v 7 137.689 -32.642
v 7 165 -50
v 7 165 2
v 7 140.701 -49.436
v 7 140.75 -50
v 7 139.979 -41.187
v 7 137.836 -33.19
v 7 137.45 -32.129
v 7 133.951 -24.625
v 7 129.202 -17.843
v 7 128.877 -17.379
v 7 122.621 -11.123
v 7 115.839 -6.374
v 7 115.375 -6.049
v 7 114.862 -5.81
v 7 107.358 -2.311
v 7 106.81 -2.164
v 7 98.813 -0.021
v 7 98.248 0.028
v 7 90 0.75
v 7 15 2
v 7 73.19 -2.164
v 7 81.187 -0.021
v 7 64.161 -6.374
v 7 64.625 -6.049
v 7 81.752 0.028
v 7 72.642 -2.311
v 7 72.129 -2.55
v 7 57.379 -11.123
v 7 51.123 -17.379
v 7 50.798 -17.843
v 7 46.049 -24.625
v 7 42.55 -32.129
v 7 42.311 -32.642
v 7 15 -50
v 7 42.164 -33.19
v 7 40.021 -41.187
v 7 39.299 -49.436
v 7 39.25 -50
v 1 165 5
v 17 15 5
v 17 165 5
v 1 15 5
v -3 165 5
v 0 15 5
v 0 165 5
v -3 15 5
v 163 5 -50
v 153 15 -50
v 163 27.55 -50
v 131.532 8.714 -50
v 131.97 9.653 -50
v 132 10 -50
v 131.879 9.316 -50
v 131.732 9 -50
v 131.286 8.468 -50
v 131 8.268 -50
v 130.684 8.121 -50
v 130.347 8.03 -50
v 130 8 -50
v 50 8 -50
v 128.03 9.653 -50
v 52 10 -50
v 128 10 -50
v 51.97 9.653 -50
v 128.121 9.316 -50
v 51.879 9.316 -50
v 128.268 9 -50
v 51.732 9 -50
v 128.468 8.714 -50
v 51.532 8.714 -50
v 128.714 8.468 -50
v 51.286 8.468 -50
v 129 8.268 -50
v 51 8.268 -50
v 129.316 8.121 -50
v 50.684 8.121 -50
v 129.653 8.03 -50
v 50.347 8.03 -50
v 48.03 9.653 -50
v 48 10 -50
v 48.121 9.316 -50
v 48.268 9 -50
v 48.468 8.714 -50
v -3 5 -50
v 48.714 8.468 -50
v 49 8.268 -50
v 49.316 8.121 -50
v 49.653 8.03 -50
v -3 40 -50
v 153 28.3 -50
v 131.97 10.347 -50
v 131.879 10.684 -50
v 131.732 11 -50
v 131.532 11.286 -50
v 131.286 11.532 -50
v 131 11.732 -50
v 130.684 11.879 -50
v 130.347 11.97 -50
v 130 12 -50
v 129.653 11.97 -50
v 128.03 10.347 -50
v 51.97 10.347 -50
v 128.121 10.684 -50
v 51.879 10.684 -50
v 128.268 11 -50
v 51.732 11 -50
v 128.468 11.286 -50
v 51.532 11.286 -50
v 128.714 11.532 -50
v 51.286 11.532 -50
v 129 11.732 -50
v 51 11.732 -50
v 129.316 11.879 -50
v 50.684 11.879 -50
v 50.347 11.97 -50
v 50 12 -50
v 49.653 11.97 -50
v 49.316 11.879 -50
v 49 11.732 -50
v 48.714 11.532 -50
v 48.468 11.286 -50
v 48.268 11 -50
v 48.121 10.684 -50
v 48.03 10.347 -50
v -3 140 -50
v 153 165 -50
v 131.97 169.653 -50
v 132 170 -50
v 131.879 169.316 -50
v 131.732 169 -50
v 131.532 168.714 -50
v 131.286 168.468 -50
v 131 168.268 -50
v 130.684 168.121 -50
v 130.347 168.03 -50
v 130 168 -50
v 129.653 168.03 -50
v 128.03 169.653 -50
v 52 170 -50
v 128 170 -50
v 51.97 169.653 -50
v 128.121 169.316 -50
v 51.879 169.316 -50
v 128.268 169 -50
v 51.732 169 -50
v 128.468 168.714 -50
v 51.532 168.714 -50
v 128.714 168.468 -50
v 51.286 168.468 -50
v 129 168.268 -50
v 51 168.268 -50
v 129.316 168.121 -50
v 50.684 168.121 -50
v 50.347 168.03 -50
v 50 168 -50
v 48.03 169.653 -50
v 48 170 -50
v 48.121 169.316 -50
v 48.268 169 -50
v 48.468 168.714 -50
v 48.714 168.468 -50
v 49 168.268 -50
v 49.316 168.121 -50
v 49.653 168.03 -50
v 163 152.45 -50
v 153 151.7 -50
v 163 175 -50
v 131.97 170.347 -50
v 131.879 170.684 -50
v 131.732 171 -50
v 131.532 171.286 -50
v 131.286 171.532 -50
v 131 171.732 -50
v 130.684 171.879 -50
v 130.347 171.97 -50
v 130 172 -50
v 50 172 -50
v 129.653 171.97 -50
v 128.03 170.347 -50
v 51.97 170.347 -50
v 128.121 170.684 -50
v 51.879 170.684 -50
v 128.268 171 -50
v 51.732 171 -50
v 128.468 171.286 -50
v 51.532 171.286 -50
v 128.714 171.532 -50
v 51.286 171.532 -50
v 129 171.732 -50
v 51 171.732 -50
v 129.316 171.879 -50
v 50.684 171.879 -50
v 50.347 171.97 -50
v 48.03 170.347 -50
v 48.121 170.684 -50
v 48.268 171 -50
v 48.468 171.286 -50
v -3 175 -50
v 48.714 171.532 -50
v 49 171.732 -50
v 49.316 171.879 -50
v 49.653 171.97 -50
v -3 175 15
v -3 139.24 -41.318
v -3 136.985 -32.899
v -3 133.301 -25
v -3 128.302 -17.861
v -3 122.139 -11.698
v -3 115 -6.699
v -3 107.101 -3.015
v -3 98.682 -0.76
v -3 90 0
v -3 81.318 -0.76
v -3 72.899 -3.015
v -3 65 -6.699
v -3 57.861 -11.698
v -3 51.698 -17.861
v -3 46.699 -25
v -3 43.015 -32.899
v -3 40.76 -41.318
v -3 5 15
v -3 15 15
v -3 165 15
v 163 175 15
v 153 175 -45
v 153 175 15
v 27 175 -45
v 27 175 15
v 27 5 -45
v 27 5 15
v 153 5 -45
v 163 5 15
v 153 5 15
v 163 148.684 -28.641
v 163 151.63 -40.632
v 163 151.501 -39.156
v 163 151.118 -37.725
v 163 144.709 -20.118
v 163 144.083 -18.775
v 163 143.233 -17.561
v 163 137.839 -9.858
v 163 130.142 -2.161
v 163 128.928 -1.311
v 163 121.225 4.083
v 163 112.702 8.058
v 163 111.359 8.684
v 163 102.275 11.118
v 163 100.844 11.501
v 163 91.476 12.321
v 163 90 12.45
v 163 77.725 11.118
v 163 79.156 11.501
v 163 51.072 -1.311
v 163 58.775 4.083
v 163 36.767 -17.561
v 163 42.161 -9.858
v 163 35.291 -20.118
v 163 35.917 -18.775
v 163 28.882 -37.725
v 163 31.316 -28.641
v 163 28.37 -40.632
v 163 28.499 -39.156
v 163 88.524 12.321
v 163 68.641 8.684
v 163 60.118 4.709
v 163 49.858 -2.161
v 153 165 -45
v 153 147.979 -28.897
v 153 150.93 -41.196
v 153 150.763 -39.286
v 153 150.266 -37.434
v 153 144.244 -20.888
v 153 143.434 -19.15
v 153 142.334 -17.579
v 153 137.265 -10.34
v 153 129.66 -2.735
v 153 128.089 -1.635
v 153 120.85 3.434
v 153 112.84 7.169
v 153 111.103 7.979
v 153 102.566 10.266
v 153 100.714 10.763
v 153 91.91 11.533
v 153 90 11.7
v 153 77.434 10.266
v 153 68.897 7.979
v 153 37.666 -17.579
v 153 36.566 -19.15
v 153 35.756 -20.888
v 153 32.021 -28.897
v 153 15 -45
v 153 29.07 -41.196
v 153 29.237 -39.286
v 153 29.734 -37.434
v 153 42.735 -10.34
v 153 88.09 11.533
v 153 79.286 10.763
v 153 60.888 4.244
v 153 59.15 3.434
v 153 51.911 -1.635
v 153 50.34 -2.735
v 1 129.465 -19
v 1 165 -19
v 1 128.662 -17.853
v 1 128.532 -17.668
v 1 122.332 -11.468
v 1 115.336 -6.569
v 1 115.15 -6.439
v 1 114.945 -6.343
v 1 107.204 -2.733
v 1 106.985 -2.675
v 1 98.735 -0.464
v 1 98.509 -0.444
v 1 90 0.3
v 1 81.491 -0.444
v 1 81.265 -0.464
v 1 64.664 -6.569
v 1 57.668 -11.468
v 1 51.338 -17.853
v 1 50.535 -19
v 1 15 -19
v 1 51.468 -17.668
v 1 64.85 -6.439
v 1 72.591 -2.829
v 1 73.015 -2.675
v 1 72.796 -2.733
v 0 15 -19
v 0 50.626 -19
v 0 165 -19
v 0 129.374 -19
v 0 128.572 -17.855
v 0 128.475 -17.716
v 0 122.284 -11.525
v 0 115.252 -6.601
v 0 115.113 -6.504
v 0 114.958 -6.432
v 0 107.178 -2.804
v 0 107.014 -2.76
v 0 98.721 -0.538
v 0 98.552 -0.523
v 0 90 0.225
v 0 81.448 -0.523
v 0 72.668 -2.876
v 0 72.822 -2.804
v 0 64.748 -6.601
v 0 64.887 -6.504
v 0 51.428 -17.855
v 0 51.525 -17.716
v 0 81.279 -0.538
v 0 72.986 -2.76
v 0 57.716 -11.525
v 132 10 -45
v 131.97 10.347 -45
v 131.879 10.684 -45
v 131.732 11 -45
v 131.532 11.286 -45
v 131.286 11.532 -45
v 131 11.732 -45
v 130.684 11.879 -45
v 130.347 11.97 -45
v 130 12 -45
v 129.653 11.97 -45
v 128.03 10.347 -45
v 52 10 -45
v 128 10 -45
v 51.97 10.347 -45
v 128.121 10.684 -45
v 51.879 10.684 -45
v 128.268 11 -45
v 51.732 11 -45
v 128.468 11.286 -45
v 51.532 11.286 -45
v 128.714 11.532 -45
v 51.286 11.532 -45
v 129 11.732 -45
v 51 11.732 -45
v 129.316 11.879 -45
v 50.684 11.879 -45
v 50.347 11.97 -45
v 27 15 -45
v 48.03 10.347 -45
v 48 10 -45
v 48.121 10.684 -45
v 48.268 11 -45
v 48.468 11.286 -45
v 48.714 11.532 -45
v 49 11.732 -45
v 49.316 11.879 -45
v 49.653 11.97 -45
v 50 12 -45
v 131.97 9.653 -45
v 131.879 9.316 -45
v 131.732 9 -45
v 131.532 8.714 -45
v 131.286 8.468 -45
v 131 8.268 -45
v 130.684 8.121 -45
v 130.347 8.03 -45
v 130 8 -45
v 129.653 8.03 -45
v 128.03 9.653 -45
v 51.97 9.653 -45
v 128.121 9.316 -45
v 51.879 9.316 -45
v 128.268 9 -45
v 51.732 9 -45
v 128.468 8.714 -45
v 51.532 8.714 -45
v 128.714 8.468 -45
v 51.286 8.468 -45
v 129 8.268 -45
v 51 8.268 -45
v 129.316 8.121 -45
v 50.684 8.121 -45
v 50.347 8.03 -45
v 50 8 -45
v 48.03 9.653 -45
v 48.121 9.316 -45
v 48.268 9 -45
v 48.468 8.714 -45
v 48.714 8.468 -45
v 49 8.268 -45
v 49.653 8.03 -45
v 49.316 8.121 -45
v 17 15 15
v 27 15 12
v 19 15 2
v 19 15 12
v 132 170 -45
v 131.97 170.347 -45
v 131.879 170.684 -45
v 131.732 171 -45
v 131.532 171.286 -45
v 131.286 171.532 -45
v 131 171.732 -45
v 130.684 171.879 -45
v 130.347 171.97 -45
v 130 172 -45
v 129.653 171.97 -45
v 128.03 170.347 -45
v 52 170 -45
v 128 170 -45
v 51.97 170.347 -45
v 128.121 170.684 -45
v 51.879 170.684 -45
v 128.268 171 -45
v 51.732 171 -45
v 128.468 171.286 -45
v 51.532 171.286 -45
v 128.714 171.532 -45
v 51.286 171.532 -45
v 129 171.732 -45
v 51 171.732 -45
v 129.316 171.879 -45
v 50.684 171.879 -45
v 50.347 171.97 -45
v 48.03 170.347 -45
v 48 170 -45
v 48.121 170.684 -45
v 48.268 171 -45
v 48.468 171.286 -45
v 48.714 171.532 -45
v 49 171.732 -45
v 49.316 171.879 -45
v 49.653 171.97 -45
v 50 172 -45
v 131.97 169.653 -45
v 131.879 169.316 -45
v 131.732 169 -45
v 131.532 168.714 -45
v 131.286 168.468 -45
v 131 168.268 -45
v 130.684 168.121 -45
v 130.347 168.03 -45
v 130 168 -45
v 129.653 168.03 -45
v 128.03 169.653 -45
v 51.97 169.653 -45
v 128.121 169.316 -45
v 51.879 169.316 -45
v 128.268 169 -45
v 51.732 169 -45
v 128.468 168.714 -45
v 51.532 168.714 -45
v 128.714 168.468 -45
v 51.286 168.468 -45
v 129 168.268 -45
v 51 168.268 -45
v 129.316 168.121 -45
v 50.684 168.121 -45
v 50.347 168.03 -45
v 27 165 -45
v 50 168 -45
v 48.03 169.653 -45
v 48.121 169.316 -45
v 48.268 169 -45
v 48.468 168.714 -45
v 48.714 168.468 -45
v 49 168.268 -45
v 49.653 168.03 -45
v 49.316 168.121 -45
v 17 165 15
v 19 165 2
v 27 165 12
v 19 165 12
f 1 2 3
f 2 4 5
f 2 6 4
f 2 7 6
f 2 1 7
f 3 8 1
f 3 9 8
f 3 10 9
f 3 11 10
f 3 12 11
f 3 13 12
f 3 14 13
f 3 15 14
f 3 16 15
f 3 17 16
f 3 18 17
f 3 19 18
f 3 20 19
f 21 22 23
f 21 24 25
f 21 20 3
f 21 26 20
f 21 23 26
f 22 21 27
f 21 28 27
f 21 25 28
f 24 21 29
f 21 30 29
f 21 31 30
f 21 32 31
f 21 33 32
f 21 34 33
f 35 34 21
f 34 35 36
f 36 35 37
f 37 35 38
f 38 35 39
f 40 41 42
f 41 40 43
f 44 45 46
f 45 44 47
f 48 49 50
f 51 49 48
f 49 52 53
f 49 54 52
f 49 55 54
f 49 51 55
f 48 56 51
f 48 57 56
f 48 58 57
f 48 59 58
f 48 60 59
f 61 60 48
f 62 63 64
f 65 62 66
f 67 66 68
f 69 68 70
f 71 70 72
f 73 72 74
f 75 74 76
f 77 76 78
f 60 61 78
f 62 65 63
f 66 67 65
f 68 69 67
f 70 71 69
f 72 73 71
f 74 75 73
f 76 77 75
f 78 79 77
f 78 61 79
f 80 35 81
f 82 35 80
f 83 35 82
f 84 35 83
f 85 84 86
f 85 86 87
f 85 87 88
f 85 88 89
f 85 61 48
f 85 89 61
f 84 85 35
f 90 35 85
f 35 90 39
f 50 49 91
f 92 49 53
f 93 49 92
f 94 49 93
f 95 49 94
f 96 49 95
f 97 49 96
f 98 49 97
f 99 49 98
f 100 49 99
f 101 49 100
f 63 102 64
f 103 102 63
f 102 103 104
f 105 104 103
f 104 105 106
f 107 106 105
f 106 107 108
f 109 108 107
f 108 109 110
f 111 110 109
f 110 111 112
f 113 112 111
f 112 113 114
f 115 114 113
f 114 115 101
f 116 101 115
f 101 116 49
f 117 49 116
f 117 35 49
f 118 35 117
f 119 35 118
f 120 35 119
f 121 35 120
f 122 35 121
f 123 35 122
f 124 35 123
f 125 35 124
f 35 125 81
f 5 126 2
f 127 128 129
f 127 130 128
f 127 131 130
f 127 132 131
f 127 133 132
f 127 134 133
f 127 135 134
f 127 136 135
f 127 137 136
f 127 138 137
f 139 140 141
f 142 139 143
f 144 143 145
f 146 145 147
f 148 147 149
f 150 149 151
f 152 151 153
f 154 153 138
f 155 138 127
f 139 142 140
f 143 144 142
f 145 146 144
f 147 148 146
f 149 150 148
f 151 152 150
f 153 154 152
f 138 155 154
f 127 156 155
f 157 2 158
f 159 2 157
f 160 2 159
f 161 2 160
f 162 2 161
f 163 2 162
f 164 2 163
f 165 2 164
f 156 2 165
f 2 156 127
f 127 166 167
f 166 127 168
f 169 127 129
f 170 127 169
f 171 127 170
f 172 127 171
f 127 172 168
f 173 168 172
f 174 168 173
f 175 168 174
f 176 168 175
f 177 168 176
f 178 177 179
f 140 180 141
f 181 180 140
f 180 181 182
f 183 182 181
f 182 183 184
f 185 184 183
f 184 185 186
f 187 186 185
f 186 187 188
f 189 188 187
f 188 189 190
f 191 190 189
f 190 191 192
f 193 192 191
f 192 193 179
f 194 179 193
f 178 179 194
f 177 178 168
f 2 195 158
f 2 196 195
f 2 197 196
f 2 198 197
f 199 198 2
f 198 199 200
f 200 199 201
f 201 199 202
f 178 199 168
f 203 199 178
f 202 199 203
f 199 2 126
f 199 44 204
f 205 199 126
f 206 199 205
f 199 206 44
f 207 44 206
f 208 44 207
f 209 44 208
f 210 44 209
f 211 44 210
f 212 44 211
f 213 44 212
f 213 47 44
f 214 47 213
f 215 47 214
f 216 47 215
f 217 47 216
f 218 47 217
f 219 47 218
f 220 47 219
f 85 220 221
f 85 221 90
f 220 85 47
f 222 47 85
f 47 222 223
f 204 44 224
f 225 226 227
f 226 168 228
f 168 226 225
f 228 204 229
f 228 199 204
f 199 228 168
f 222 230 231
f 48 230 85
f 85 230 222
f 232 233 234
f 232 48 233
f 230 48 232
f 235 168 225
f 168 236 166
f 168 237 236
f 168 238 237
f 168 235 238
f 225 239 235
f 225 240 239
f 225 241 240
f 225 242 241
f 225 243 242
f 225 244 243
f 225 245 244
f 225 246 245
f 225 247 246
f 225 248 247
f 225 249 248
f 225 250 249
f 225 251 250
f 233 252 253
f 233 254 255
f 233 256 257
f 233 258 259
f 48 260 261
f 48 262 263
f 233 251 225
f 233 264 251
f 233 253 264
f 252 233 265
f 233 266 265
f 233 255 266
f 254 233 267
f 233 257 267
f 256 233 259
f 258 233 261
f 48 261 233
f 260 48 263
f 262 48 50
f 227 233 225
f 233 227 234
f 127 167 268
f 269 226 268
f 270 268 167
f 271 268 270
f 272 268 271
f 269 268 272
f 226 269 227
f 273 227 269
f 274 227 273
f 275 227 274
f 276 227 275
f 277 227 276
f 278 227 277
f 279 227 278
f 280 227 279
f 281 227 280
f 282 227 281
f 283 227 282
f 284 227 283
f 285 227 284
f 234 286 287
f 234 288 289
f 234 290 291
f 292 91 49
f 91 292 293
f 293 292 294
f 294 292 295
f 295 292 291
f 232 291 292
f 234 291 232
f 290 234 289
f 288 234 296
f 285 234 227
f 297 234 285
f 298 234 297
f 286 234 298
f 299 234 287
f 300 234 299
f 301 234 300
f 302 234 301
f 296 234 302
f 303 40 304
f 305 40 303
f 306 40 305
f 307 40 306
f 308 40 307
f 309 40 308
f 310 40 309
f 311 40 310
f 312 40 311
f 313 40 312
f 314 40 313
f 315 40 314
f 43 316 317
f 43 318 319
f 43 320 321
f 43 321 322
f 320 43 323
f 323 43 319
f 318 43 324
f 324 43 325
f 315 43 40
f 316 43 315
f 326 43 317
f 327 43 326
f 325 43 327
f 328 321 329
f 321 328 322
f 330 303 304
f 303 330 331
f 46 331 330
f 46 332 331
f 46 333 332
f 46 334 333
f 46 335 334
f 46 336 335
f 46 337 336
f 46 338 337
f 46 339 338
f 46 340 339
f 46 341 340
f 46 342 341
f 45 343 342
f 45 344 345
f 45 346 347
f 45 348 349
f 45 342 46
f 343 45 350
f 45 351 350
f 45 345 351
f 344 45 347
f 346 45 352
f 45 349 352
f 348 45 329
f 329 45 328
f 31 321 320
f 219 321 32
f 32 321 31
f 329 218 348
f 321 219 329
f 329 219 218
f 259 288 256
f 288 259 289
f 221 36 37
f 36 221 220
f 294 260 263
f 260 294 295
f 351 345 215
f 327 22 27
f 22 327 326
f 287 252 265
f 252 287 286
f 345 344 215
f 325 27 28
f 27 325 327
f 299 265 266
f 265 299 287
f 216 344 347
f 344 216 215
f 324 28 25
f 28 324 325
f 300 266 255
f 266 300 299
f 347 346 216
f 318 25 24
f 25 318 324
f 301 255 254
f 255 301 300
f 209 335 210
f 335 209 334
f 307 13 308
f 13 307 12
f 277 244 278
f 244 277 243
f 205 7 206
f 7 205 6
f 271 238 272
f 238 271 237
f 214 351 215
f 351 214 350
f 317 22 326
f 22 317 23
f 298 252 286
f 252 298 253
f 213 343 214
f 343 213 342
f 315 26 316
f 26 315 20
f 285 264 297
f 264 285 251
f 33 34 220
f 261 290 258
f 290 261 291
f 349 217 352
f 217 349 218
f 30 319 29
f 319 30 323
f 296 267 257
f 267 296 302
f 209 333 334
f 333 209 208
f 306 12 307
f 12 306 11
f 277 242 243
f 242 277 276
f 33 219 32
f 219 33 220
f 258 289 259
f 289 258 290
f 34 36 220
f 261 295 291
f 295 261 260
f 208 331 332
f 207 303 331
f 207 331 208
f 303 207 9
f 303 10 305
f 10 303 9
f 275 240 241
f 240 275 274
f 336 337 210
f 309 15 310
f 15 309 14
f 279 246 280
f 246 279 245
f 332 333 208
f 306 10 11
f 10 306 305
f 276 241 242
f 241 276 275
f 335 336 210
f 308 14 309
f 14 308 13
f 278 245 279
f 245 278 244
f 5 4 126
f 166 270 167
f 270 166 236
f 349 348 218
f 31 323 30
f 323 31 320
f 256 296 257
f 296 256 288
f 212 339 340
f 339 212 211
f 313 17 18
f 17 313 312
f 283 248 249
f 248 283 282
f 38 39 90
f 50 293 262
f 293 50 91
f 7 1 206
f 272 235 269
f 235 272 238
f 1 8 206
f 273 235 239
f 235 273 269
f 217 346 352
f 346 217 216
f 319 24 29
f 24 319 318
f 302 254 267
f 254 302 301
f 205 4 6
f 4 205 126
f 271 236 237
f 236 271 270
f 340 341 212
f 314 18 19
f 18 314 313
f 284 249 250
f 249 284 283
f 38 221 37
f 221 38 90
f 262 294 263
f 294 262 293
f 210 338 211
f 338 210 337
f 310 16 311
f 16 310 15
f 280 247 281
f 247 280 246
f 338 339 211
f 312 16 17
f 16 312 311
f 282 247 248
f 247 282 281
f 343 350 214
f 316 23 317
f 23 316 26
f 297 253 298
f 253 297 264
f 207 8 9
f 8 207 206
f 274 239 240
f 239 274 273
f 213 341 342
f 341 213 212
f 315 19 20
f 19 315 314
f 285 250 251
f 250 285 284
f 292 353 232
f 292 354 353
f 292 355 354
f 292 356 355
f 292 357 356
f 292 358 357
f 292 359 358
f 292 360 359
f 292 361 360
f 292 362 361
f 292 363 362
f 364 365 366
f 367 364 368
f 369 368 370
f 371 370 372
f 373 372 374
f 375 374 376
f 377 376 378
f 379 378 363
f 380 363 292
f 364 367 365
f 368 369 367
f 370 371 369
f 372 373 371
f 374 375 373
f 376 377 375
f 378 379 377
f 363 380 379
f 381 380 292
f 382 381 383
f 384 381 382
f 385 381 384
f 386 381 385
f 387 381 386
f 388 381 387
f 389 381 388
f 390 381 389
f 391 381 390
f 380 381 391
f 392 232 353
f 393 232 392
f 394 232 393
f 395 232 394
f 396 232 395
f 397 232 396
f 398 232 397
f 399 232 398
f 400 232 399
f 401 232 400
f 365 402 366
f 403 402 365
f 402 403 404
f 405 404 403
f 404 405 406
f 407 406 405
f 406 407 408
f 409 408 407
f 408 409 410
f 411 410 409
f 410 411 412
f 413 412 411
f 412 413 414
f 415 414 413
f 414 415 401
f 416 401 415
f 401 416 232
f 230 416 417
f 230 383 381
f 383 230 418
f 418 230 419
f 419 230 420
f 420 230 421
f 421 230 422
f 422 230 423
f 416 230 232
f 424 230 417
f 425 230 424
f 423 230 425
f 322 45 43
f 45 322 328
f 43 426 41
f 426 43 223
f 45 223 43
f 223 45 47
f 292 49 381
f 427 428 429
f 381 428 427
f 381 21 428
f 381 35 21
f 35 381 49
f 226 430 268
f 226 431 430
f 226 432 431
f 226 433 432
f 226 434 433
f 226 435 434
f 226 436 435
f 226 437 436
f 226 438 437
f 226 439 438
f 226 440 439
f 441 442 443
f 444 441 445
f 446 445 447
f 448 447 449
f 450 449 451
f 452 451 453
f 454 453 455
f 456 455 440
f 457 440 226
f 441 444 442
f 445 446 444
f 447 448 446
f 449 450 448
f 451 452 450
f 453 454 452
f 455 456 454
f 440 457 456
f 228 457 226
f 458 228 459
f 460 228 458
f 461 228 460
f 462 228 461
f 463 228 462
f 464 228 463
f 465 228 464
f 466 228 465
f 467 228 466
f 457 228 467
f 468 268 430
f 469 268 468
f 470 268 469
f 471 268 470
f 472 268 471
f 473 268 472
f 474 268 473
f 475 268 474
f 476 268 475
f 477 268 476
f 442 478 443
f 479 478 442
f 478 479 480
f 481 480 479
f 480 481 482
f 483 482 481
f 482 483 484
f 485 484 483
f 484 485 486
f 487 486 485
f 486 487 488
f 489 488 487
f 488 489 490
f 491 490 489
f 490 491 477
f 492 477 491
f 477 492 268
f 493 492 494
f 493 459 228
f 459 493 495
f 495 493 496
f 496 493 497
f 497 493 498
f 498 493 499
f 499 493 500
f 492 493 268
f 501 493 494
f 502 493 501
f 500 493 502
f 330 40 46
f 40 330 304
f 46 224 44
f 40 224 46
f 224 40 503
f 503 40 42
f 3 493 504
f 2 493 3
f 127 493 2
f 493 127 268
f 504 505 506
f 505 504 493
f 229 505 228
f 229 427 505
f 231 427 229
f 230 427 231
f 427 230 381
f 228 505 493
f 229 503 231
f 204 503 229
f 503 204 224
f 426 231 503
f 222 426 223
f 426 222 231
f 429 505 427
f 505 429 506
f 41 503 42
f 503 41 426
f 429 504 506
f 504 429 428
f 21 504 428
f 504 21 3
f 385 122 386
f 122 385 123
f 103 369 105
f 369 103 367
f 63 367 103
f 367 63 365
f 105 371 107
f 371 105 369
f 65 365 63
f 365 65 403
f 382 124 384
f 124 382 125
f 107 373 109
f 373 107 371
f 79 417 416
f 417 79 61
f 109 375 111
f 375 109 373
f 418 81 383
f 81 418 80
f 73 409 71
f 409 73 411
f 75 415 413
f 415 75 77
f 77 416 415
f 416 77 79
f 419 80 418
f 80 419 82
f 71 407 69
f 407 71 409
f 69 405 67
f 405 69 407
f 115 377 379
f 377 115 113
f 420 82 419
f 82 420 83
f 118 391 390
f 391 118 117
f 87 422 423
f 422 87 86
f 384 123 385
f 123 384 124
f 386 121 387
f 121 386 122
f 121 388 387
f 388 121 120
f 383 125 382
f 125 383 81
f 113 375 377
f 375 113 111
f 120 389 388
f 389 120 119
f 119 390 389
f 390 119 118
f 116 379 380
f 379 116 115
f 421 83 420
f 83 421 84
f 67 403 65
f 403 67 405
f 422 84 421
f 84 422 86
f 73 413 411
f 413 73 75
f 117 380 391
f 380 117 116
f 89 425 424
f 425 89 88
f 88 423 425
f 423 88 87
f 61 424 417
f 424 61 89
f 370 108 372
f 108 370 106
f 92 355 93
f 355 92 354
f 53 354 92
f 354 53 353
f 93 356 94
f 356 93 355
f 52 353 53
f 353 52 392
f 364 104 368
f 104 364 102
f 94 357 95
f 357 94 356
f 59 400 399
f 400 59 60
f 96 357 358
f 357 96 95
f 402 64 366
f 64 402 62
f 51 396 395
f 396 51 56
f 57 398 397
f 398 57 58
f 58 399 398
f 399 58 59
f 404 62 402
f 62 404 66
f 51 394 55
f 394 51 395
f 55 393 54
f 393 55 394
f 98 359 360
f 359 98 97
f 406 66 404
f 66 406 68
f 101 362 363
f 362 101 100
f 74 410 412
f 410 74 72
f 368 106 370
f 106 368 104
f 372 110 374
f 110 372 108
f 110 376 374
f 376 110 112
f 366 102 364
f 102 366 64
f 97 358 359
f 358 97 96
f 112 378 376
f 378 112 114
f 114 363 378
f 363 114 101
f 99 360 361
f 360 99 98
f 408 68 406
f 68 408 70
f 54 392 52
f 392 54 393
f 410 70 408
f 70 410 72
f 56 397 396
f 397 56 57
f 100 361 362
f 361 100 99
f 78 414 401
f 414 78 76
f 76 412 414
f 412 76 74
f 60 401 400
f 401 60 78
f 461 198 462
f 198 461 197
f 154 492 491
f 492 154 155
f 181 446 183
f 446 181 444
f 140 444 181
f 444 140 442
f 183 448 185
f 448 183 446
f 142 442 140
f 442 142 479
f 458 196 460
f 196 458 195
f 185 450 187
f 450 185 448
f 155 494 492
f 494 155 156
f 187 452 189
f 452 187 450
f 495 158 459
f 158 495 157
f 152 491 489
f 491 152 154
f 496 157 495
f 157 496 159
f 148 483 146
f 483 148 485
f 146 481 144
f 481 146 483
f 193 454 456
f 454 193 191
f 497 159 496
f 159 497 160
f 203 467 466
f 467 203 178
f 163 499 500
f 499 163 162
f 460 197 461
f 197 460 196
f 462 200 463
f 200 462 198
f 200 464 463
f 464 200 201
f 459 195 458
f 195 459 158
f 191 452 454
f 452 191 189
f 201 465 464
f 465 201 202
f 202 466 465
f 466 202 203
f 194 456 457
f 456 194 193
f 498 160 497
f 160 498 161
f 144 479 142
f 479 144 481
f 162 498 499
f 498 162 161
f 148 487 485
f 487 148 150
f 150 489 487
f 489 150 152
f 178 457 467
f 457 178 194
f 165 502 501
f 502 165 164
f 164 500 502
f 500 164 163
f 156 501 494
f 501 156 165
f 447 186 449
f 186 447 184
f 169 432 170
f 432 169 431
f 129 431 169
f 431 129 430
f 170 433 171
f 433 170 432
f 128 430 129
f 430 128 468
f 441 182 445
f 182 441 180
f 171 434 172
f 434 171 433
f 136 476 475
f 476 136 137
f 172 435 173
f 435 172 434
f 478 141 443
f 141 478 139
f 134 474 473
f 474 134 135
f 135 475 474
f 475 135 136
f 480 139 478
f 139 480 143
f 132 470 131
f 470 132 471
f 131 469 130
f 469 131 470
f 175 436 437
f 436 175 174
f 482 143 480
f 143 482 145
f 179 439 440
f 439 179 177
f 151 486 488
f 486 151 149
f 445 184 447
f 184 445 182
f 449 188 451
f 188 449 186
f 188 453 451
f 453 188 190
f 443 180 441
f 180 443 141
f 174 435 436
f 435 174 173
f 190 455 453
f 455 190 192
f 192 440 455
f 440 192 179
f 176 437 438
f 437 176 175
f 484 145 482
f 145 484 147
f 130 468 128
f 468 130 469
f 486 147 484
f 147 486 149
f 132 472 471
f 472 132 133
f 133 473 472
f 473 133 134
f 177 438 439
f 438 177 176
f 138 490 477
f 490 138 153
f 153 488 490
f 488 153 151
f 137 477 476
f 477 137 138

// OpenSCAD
wall_thickness = 4;
bay_height = 35;
bays = 4;
caddy_width = 110;
bezel_depth = 35;
cage_depth = 149;
backplane_width = 113;
backplane_height = 143;
fan_height = 30;
backplane_offset_y = wall_thickness - 0.5;
backplane_offset_z = wall_thickness - 1;

cage_width = caddy_width + wall_thickness*2;
cage_height = (bay_height*4)+wall_thickness*2;

pcie_bracket_thickness=1.5;

$fn=36;

module gpu_stand(){
   difference(){
        union(){
            translate([-3,5,-50]){
                cube([10,170,55]);
            }
            translate([153,5,-50]){
                cube([10,170,65]);
            }
            
        }
        translate([0,7,-19]){
            cube([1,166,40]);
        }
        translate([-3,90,-50]){
            rotate([0,90,0]){
                cylinder(200,50,65);
            }
        }
    }
    difference(){
        union(){
            translate([-3,5,-50]){
                //cube([30,170,5]);
            }
            translate([-3,5,-50]){
                cube([165,10,5]);
            }
            translate([-3,165,-50]){
                cube([165,10,5]);
            }
            translate([153,5,-50]){
                //cube([10,170,5]);
            }
            translate([-3,5,-50]){
                cube([30,10,65]);
            }
            translate([-3,165,-50]){
                cube([30,10,65]);
            }
            translate([153,5,-50]){
                cube([10,10,65]);
            }
            translate([153,165,-50]){
                cube([10,10,65]);
            }

           
            translate([17,5,12]){
                cube([10,170,3]);
            }
            translate([17,5,2]){
                cube([2,170,10]);
            }
            translate([7,5,2]){
                cube([10,170,3]);
            }
        }
        translate([2,0,-40]){
            //cube([20,200,30]);
        }
        translate([50,10,-50]){
            cylinder(10,2,2);
        }
        translate([130,10,-50]){
            cylinder(10,2,2);
        }
        translate([50,170,-50]){
            cylinder(10,2,2);
        }
        translate([130,170,-50]){
            cylinder(10,2,2);
        }
    }
    
}

module front_panel_fan(){
    difference(){
        cube([30,150,150]);
        translate([3,15,15]){
            cube([30,120,120]);
        }
        translate([0,75,75]){
            rotate([0,90,0]){
                cylinder(20,55,55);
            }
        }
    }
}
module pci_bracket() {
union() {
difference() {
union () {
translate([0,-0.25,0]) cube([115,18.5,pcie_bracket_thickness],center=true);
translate([58.5,2.5,0]) cube([8,18.5,pcie_bracket_thickness],center=true);
}
translate([57,-13.7,0]) rotate([0,0,40]) cube([10,10,10],center=true);
translate([55,16,0]) rotate([0,0,40]) cube([10,10,10],center=true);
translate([-50,-12.5,0]) rotate([0,0,45]) cube([10,10,10],center=true);
translate([-50,12.5,0]) rotate([0,0,45]) cube([10,10,10],center=true);
translate([-55,-10.5,0]) cube([10,10,10],center=true);
translate([-55,10.5,0]) cube([10,10,10],center=true);
}
difference() {
translate([62,2.5,6]) cube([pcie_bracket_thickness,18.5,11],center=true);
translate([62,10.75,5.5]) cube([2,6,4],center=true);
translate([62,8,5.5]) rotate([0,90,0]) cylinder(r=2,h=2,center=true);
}
}
}

module vga_hole() { //28 long
translate([12.5,0,0]) cylinder(r=1.5,h=10,center=true);
translate([-12.5,0,0]) cylinder(r=1.5,h=10,center=true);
cube([19,11,10],center=true);
}

module dvi_hole() { //36 long
union() {
translate([16.5,0,0]) cylinder(r=1.5,h=10,center=true);
translate([-16.5,0,0]) cylinder(r=1.5,h=10,center=true);
cube([24.5,9,10],center=true);
}
}

module drive_cage_damper(){
    union(){
        cube([10,3,cage_height]);
        translate([5,3+wall_thickness,19]){
            rotate([90,0,0]){
                cylinder(wall_thickness,1.6,1.6);
            }
        }
        translate([5,3+wall_thickness,19+bay_height]){
            rotate([90,0,0]){
                cylinder(wall_thickness,1.6,1.6);
            }
        }
         translate([5,3+wall_thickness,19+bay_height*2]){
            rotate([90,0,0]){
                cylinder(wall_thickness,1.6,1.6);
            }
        }
        translate([5,3+wall_thickness,19+bay_height*3]){
            rotate([90,0,0]){
                cylinder(wall_thickness,1.6,1.6);
            }
        }
    }
}

module gpu_bracket() {
    difference() {
        pci_bracket();
        translate([-30,0,0]) {
        //translate([35,1,0]) {
        vga_hole();
        translate([60,0,0]) {
        // translate([-41,-2,0]) {
          dvi_hole();
        }
     }
}
}



module psu(){
    cube([160,150,86]);
}

module cpu_cooler(){
    translate([20,0,0]){
        cube([20,360,120]);
    }
    fan();
    translate([0,120,0]){
        fan();
    }
    translate([0,240,0]){
        fan();
    }
}

module fan(){
    difference(){
        cube([20,120,120]);
        translate([0,60,60]){
            rotate([0,90,0]){
                cylinder(20,55,55);
            }
        }
    }
    
}

module gpu(){
    translate([0,0,15]){
        cube([312,63,111.5]);
    }
    translate([45,61,0]){
        cube([85,2,15]);
    }
    translate([33,61,5]){
        cube([8,2,10]);
    }
    translate([0,61,5]){
        cube([15,2,10]);
    }
    
    translate([0,36,38]){
        rotate([90,270,270]){
            gpu_bracket();
        }
    }
    translate([0,54,38]){
        rotate([90,270,270]){
            gpu_bracket();
        }
    }
}

module motherboard(){
  cube([300,330,30]);
}

module support_board(){
        cube([500,320,10]);
        translate([0,330,0]){
            cube([500,600,10]);
        }
}

module fan_holder(){
    translate([5+bezel_depth+cage_depth+3,(cage_width-105)/2,cage_height-wall_thickness-115]){
        rotate([0,90,0]){
            cylinder(fan_height,2.2,2.2);
            translate([0,105,0]){
                cylinder(fan_height,2.2,2.2);
            }
            translate([-105,0,0]){
                cylinder(fan_height,2.2,2.2);
            }
            translate([-105,105,0]){
                cylinder(fan_height,2.2,2.2);
            }
        }
        //bottom left corner
        translate([0,-2,-3]){
                cube([13,20,5]);     
        }
        //top piece
        translate([0,-3,103]){
                cube([13,backplane_width,6]);     
        }
        //top left sticky up bit
        translate([0,-3,108]){
                cube([13,5,9]);     
        }
        translate([13,-3,113]){
                cube([10,5,4]);     
        }
        //top right sticky up bit
        translate([0,backplane_width-9,108]){
                cube([13,5,9]);     
        }
        translate([13,backplane_width-9,113]){
                cube([10,5,4]);     
        }
        //right piece
        translate([0,backplane_width-11,-3]){
                cube([13,6,34]);     
        }
        //left sticky down bit
        translate([0,-2,-26]){
                cube([13,5,23]);     
        }
        translate([13,-2,-11]){
                cube([10,6,4]);     
        }
        //right sticky down bit
        translate([0,105,-26]){
                cube([13,6,23]);     
        }
        translate([13,105,-11]){
                cube([10,6,4]);     
        }
        //horizontal middle piece
        translate([0,13,30]){
                cube([13,95,5]);     
        }
        //vertical left piece
        translate([0,13,-3]){
                cube([13,5,108]);     
        }
        //vertical right piece
        translate([0,55,30]){
                cube([13,5,78]);     
        }
        
    }
}


module nubbin(){
    difference(){
             cube([2,backplane_width,1]);                
             translate([0,0,1]){
                 rotate([0,33,0]){
                    cube([4,backplane_width,2]);
                 }
             }
         }
}


module backplane(){
    translate([bezel_depth+cage_depth+5,0,0-wall_thickness]){
        union(){
            difference(){
                cube([15,cage_width,cage_height]);
                //hollow out space for backplane to sit
                translate([0,backplane_offset_y,backplane_offset_z]){
                    cube([15,backplane_width,backplane_height]);
                }
                //cutout for cable
                translate([3,backplane_offset_y+backplane_width,65]){
                    cube([12,8,25]);
                }
                
            }
            translate([3,wall_thickness,wall_thickness-1]){
                nubbin();
            }
            translate([3,backplane_offset_y+backplane_width,backplane_offset_z+backplane_height]){
                rotate([0,180,180]){
                     nubbin();
                }
            }    
        }
        //fan();
    }
}

module cage_body(){
//main body
difference(){
    translate([5+bezel_depth,0,0]){
        cube([cage_depth,wall_thickness,bay_height]);
    }
    translate([25+bezel_depth,4,15]){
        rotate([90,0,0]){
            cylinder(wall_thickness,2,1.5);
        }
    }
    translate([5+bezel_depth+cage_depth-20,4,15]){
        rotate([90,0,0]){
            cylinder(wall_thickness,2,1.5);
        }
    }
}
//lower track strip
translate([5+bezel_depth,wall_thickness,0])cube([cage_depth,3.5,7]);
difference(){   
    //upper track strip
    translate([5+bezel_depth,wall_thickness,(bay_height-1)-7])cube([149,3.5,8]);
    //connector inset
    translate([5+bezel_depth,wall_thickness,(bay_height-4)])cube([10,6,6]);
   
}

}

module bezel_body(){
    //main body
        difference(){
            translate([5,0,0]){
                cube([bezel_depth,wall_thickness,bay_height]);
            }
            translate([8,2,2]){
                cube([7,wall_thickness-2,bay_height-4]);
            }
            
        }
    //bottom rail
    translate([15,wall_thickness,0])cube([bezel_depth-10,3.5,7]);
    //top rail
    translate([15,wall_thickness,27])cube([bezel_depth-10,3.5,8]);
    //connectors
    translate([20,wall_thickness,(35-3.5)])cube([30,3.5,3.5]);

}

module bezel_front(left,depth,width){
       //front indents
        initial = 27;
        for(i=[0:4]){
          difference(){
            loop_offset = initial + ((i-1)*35);
            if (i == 0) {
                translate([5,left,0]){
                    cube([depth,width,7]);
                }
            } else if (i == 4){
                translate([5,left,loop_offset]){
                    cube([depth,width,11]);
                } 
            } else {
                translate([5,left,loop_offset]){
                    cube([depth,width,15]);
                } 
            }
          }
        }
}

module drive_cage(){
        translate([5+bezel_depth,0,0-wall_thickness])cube([cage_depth,cage_width,wall_thickness]);
        translate([5+bezel_depth,0,bay_height*4])cube([cage_depth,cage_width,wall_thickness]);
        for(i=[0:3]){
            translate([0,0,i*bay_height]){
                union(){
                    cage_body();
                    translate([0,cage_width,0])mirror([0,1,0])cage_body();
                }
            }
                
        }
        
}

module bezel(){
        difference(){
                translate([5,0,0-wall_thickness])cube([bezel_depth,cage_width,wall_thickness]);
                translate([15,20,0-wall_thickness]){
                        cylinder(10,2.5,2.5);
                }
                translate([15,cage_width-20,0-wall_thickness]){
                        cylinder(10,2.5,2.5);
                }
        }
                translate([5,0,bay_height*4])cube([bezel_depth,cage_width,wall_thickness]);
        for(i=[0:3]){
            translate([0,0,i*bay_height]){
                union(){
                    bezel_body();
                    translate([0,cage_width,0])mirror([0,1,0])bezel_body();
                }
            }
                
    }
    
    bezel_front(wall_thickness+caddy_width-3.5,3,3.5);
    bezel_front(0,13,wall_thickness+3.5);
}



module full_drive_cage(){
    bezel();
    drive_cage();
    backplane();
    fan_holder();
}

module everything(){
    translate([0,0,-20]){
    support_board();
    }
    translate([300,5,5]){
        psu();
    }

    translate([50,585,-4]){
        motherboard();
    }

    translate([40,345,40]){
        gpu();
        gpu_stand();
    }
    translate([40,420,40]){
        gpu();
        gpu_stand();
    }
    translate([40,495,40]){
        gpu();
        gpu_stand();
    }

    translate([0,335,0]){
        front_panel_fan();
    }
    translate([0,475,0]){
        front_panel_fan();
    }

    rotate([90,0,0]){
        translate([0,0,-150]){
            full_drive_cage();
        }
    }

    rotate([90,0,0]){
        translate([0,0,-300]){
            full_drive_cage();
        }
    }

    translate([400,530,5]){
        cpu_cooler();
    }
}

module printable_drive_cage_part1(){
    drive_cage();
    backplane();
}

module printable_drive_cage_part2(){
    bezel();
}

module printable_drive_cage_part3(){
    fan_holder();
}

module printable_drive_cage_damper(){
    drive_cage_damper();
}

module printable_gpu_support(){
    gpu_stand();
}

//Uncomment 1 of the below//

//everything();
//printable_drive_cage_part1();
//printable_drive_cage_part2();
//printable_drive_cage_part3();
//printable_gpu_support();    


gpu_stand();
